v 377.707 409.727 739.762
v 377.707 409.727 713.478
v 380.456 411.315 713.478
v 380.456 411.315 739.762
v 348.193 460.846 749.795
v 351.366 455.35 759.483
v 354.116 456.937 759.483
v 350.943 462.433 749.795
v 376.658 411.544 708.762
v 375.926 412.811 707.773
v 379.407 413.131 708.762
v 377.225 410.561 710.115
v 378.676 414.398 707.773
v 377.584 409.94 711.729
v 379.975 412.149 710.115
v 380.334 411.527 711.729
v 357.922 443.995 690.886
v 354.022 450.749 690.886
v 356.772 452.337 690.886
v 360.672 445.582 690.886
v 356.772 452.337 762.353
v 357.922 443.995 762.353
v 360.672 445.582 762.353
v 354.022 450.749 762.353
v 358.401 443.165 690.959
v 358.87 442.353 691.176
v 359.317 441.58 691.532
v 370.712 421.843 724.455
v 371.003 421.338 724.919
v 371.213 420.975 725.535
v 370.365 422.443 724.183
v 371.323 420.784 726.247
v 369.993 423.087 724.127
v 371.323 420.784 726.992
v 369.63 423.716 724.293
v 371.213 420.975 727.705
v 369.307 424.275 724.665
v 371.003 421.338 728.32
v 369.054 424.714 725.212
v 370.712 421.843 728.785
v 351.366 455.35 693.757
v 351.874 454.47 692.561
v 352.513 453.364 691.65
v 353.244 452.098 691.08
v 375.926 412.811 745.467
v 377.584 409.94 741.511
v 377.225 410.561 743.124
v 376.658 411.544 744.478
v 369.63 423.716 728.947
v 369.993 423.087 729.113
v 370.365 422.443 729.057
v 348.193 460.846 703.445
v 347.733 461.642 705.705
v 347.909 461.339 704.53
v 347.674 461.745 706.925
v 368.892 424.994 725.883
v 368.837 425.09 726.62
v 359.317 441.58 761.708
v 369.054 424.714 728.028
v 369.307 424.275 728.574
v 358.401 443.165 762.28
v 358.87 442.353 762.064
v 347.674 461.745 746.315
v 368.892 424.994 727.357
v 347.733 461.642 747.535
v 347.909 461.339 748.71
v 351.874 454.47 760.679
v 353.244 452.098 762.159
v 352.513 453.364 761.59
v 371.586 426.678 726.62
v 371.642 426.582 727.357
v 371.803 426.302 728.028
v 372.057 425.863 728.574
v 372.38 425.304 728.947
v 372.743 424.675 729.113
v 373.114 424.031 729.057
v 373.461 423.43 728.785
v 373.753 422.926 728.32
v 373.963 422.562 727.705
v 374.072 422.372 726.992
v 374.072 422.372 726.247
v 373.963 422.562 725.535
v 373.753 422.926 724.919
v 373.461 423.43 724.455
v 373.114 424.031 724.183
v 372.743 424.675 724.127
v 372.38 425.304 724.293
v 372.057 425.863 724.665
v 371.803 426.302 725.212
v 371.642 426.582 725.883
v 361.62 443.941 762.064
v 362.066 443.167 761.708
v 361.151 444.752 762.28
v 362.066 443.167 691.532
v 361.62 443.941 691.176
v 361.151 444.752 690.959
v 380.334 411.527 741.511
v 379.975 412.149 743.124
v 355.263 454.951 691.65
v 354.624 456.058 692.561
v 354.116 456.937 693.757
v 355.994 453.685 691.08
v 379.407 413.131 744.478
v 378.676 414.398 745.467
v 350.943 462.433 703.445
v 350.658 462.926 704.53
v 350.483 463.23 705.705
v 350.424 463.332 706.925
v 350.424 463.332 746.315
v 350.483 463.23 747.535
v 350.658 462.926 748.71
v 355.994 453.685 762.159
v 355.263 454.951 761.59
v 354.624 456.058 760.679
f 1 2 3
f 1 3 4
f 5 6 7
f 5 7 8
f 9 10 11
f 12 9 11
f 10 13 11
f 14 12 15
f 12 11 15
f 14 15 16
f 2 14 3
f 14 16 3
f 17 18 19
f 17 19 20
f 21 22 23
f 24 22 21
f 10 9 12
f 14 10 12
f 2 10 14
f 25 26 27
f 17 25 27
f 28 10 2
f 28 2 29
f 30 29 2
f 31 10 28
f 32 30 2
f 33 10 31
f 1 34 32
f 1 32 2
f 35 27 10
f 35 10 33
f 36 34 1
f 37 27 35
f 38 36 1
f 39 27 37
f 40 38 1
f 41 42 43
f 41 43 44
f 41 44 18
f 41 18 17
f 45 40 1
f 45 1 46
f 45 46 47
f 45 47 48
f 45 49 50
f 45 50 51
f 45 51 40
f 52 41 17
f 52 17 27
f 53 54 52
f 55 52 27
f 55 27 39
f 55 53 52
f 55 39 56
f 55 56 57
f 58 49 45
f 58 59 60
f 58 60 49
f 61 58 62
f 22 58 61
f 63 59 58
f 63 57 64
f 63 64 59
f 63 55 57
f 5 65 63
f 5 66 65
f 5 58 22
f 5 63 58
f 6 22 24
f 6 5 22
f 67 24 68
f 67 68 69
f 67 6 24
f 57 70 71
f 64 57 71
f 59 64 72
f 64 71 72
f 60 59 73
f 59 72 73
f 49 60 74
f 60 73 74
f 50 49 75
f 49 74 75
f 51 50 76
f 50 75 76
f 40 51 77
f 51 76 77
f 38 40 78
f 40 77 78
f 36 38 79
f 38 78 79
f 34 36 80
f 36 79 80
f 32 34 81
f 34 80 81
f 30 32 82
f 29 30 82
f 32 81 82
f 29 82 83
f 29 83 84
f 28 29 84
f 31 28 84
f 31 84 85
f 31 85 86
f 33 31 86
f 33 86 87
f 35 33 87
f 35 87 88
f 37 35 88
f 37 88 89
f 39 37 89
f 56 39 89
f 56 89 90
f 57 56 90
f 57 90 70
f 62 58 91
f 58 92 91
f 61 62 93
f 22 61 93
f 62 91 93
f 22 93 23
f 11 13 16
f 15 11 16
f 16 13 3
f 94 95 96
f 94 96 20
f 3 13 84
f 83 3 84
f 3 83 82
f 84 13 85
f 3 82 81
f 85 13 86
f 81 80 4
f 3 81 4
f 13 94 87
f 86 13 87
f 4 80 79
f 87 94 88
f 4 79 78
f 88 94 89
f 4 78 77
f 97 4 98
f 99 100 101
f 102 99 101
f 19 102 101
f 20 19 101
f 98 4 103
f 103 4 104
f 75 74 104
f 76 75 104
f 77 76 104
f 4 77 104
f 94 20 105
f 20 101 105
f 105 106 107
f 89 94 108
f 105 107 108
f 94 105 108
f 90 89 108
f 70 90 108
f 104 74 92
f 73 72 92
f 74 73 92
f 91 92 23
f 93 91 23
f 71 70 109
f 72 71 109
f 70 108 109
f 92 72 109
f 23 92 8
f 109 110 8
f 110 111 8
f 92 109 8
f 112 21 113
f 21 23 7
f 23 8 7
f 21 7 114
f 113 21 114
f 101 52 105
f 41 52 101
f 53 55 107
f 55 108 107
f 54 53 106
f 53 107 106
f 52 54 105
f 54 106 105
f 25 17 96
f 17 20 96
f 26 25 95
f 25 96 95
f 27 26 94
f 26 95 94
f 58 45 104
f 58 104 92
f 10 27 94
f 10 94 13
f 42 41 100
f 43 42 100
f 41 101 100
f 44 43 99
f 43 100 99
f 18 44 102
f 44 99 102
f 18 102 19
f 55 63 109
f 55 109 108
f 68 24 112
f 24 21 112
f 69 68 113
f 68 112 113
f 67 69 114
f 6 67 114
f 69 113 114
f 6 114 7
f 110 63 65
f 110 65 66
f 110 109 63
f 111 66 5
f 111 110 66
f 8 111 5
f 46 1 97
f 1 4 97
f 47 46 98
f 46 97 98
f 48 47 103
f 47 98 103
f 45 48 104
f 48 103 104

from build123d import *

# Parameters (mm, degrees)
BOSS_EXTRUDE1_DEPTH = 3.175
FILLET1_R           = 6.35
SKETCH2_R           = 2.5
CUT_EXTRUDE1_DEPTH  = 12.192


with BuildPart() as part:
    # Sketch1 → Boss-Extrude1 (new body)
    with BuildSketch(Plane(origin=(460.696994896, 265.983534018, 0), x_dir=(0, 0, -1), z_dir=(0.8660254037844387, 0.49999999999999983, 1.3508489681243032e-15))):
        Polygon((-748.209864924, 226.045570747), (-705.029864924, 226.045570747), (-690.886483256, 216.780668208), (-690.886483256, 204.080668208), (-709.514191369, 165.980668208), (-743.725538479, 165.980668208), (-762.353246592, 204.080668208), (-762.353246592, 216.780668208), align=None)
    extrude(amount=BOSS_EXTRUDE1_DEPTH)

    # Fillet1
    fillet1_edges = [part.edges().sort_by_distance(p)[0] for p in [
        (349.04902485, 462.538490698, 748.209864924),
        (349.04902485, 462.538490698, 705.029864924),
        (353.68147612, 454.514849736, 690.886483256),
        (360.03147612, 443.516327108, 690.886483256),
        (379.08147612, 410.520759223, 709.514191369),
        (379.08147612, 410.520759223, 743.725538479),
        (360.03147612, 443.516327108, 762.353246592),
        (353.68147612, 454.514849736, 762.353246592),
    ]]
    fillet(fillet1_edges, radius=FILLET1_R)

    # Sketch2 → Cut-Extrude1 (cut)
    with BuildSketch(Plane(origin=(463.446625553, 267.571034018, 0), x_dir=(0, 0, -1), z_dir=(0.8660254037844395, 0.4999999999999987, 3.3569404763321265e-15))):
        with Locations(Location((-726.619864924, 181.220668208, 0), (0, 0, 90))):
            Circle(SKETCH2_R)
    extrude(amount=-CUT_EXTRUDE1_DEPTH, mode=Mode.SUBTRACT)


solid = part.part
